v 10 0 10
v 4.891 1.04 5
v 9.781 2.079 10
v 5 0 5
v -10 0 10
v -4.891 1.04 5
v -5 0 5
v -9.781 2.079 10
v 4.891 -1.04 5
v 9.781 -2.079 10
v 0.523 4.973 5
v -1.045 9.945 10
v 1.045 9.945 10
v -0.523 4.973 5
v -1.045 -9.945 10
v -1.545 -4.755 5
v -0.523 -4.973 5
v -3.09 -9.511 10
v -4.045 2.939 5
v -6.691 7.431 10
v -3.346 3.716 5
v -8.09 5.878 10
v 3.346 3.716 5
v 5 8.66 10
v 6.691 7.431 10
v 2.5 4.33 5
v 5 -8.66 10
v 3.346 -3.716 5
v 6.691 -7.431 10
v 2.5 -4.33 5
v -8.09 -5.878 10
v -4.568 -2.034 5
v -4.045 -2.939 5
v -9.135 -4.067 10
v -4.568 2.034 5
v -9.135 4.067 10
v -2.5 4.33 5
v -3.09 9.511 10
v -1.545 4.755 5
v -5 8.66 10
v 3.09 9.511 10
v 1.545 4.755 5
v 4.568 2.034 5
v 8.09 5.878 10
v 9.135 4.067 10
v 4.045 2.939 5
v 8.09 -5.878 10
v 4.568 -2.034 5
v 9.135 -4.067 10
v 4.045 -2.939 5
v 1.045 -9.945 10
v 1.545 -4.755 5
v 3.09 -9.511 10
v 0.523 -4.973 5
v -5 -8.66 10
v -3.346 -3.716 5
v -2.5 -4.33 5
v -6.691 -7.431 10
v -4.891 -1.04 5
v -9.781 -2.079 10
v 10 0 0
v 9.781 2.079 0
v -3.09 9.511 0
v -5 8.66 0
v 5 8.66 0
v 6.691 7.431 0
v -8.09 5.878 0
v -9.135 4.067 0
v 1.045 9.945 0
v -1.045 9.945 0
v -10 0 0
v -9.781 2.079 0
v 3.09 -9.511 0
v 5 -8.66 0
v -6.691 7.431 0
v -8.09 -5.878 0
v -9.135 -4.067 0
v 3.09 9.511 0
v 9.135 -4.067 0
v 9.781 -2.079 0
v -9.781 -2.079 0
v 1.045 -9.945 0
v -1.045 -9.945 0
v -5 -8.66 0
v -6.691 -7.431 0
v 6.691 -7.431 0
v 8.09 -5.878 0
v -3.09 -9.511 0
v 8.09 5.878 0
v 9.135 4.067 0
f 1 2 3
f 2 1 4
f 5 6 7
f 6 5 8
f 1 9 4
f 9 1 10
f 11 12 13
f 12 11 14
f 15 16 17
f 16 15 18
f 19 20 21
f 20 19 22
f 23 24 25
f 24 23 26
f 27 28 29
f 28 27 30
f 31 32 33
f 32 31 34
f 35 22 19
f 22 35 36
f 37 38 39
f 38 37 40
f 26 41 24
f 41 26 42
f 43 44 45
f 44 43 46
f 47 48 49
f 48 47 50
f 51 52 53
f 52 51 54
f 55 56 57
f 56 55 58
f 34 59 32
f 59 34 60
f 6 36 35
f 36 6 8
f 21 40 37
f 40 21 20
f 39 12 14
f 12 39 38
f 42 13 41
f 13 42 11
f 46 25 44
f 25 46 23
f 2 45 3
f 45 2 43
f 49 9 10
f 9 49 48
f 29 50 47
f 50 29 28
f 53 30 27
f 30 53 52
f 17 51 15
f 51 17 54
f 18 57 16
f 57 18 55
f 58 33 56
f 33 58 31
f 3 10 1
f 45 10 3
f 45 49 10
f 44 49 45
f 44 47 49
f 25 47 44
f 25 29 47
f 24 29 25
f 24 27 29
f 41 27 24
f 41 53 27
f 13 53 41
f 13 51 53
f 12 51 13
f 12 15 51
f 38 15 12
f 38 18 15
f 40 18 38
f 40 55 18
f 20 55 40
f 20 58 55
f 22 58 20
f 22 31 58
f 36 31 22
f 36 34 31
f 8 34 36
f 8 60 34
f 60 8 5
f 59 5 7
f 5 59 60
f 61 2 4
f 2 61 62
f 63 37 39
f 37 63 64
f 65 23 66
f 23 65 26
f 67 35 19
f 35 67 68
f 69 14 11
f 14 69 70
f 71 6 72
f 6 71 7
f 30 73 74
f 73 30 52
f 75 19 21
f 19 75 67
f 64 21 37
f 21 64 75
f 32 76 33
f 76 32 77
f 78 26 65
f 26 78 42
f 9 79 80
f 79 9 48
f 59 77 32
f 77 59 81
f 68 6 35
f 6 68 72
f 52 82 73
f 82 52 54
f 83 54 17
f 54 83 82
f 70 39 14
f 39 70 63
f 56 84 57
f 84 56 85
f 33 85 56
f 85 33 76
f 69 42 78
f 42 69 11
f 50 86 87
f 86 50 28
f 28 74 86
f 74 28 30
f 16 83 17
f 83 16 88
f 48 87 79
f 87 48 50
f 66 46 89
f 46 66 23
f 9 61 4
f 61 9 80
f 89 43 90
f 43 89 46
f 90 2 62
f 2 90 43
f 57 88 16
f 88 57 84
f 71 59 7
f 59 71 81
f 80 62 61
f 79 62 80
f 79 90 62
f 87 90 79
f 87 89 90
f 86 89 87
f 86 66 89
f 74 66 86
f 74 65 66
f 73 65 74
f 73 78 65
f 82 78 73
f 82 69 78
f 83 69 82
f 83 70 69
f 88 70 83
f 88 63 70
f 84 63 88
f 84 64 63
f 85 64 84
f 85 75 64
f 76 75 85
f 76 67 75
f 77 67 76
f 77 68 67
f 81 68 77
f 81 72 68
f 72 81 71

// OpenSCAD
// 3D Shapes- Design Time: Yo Yo

cylinder(h=10, r1=0, r2=10);
cylinder(h=10, r1=10, r2=0);
